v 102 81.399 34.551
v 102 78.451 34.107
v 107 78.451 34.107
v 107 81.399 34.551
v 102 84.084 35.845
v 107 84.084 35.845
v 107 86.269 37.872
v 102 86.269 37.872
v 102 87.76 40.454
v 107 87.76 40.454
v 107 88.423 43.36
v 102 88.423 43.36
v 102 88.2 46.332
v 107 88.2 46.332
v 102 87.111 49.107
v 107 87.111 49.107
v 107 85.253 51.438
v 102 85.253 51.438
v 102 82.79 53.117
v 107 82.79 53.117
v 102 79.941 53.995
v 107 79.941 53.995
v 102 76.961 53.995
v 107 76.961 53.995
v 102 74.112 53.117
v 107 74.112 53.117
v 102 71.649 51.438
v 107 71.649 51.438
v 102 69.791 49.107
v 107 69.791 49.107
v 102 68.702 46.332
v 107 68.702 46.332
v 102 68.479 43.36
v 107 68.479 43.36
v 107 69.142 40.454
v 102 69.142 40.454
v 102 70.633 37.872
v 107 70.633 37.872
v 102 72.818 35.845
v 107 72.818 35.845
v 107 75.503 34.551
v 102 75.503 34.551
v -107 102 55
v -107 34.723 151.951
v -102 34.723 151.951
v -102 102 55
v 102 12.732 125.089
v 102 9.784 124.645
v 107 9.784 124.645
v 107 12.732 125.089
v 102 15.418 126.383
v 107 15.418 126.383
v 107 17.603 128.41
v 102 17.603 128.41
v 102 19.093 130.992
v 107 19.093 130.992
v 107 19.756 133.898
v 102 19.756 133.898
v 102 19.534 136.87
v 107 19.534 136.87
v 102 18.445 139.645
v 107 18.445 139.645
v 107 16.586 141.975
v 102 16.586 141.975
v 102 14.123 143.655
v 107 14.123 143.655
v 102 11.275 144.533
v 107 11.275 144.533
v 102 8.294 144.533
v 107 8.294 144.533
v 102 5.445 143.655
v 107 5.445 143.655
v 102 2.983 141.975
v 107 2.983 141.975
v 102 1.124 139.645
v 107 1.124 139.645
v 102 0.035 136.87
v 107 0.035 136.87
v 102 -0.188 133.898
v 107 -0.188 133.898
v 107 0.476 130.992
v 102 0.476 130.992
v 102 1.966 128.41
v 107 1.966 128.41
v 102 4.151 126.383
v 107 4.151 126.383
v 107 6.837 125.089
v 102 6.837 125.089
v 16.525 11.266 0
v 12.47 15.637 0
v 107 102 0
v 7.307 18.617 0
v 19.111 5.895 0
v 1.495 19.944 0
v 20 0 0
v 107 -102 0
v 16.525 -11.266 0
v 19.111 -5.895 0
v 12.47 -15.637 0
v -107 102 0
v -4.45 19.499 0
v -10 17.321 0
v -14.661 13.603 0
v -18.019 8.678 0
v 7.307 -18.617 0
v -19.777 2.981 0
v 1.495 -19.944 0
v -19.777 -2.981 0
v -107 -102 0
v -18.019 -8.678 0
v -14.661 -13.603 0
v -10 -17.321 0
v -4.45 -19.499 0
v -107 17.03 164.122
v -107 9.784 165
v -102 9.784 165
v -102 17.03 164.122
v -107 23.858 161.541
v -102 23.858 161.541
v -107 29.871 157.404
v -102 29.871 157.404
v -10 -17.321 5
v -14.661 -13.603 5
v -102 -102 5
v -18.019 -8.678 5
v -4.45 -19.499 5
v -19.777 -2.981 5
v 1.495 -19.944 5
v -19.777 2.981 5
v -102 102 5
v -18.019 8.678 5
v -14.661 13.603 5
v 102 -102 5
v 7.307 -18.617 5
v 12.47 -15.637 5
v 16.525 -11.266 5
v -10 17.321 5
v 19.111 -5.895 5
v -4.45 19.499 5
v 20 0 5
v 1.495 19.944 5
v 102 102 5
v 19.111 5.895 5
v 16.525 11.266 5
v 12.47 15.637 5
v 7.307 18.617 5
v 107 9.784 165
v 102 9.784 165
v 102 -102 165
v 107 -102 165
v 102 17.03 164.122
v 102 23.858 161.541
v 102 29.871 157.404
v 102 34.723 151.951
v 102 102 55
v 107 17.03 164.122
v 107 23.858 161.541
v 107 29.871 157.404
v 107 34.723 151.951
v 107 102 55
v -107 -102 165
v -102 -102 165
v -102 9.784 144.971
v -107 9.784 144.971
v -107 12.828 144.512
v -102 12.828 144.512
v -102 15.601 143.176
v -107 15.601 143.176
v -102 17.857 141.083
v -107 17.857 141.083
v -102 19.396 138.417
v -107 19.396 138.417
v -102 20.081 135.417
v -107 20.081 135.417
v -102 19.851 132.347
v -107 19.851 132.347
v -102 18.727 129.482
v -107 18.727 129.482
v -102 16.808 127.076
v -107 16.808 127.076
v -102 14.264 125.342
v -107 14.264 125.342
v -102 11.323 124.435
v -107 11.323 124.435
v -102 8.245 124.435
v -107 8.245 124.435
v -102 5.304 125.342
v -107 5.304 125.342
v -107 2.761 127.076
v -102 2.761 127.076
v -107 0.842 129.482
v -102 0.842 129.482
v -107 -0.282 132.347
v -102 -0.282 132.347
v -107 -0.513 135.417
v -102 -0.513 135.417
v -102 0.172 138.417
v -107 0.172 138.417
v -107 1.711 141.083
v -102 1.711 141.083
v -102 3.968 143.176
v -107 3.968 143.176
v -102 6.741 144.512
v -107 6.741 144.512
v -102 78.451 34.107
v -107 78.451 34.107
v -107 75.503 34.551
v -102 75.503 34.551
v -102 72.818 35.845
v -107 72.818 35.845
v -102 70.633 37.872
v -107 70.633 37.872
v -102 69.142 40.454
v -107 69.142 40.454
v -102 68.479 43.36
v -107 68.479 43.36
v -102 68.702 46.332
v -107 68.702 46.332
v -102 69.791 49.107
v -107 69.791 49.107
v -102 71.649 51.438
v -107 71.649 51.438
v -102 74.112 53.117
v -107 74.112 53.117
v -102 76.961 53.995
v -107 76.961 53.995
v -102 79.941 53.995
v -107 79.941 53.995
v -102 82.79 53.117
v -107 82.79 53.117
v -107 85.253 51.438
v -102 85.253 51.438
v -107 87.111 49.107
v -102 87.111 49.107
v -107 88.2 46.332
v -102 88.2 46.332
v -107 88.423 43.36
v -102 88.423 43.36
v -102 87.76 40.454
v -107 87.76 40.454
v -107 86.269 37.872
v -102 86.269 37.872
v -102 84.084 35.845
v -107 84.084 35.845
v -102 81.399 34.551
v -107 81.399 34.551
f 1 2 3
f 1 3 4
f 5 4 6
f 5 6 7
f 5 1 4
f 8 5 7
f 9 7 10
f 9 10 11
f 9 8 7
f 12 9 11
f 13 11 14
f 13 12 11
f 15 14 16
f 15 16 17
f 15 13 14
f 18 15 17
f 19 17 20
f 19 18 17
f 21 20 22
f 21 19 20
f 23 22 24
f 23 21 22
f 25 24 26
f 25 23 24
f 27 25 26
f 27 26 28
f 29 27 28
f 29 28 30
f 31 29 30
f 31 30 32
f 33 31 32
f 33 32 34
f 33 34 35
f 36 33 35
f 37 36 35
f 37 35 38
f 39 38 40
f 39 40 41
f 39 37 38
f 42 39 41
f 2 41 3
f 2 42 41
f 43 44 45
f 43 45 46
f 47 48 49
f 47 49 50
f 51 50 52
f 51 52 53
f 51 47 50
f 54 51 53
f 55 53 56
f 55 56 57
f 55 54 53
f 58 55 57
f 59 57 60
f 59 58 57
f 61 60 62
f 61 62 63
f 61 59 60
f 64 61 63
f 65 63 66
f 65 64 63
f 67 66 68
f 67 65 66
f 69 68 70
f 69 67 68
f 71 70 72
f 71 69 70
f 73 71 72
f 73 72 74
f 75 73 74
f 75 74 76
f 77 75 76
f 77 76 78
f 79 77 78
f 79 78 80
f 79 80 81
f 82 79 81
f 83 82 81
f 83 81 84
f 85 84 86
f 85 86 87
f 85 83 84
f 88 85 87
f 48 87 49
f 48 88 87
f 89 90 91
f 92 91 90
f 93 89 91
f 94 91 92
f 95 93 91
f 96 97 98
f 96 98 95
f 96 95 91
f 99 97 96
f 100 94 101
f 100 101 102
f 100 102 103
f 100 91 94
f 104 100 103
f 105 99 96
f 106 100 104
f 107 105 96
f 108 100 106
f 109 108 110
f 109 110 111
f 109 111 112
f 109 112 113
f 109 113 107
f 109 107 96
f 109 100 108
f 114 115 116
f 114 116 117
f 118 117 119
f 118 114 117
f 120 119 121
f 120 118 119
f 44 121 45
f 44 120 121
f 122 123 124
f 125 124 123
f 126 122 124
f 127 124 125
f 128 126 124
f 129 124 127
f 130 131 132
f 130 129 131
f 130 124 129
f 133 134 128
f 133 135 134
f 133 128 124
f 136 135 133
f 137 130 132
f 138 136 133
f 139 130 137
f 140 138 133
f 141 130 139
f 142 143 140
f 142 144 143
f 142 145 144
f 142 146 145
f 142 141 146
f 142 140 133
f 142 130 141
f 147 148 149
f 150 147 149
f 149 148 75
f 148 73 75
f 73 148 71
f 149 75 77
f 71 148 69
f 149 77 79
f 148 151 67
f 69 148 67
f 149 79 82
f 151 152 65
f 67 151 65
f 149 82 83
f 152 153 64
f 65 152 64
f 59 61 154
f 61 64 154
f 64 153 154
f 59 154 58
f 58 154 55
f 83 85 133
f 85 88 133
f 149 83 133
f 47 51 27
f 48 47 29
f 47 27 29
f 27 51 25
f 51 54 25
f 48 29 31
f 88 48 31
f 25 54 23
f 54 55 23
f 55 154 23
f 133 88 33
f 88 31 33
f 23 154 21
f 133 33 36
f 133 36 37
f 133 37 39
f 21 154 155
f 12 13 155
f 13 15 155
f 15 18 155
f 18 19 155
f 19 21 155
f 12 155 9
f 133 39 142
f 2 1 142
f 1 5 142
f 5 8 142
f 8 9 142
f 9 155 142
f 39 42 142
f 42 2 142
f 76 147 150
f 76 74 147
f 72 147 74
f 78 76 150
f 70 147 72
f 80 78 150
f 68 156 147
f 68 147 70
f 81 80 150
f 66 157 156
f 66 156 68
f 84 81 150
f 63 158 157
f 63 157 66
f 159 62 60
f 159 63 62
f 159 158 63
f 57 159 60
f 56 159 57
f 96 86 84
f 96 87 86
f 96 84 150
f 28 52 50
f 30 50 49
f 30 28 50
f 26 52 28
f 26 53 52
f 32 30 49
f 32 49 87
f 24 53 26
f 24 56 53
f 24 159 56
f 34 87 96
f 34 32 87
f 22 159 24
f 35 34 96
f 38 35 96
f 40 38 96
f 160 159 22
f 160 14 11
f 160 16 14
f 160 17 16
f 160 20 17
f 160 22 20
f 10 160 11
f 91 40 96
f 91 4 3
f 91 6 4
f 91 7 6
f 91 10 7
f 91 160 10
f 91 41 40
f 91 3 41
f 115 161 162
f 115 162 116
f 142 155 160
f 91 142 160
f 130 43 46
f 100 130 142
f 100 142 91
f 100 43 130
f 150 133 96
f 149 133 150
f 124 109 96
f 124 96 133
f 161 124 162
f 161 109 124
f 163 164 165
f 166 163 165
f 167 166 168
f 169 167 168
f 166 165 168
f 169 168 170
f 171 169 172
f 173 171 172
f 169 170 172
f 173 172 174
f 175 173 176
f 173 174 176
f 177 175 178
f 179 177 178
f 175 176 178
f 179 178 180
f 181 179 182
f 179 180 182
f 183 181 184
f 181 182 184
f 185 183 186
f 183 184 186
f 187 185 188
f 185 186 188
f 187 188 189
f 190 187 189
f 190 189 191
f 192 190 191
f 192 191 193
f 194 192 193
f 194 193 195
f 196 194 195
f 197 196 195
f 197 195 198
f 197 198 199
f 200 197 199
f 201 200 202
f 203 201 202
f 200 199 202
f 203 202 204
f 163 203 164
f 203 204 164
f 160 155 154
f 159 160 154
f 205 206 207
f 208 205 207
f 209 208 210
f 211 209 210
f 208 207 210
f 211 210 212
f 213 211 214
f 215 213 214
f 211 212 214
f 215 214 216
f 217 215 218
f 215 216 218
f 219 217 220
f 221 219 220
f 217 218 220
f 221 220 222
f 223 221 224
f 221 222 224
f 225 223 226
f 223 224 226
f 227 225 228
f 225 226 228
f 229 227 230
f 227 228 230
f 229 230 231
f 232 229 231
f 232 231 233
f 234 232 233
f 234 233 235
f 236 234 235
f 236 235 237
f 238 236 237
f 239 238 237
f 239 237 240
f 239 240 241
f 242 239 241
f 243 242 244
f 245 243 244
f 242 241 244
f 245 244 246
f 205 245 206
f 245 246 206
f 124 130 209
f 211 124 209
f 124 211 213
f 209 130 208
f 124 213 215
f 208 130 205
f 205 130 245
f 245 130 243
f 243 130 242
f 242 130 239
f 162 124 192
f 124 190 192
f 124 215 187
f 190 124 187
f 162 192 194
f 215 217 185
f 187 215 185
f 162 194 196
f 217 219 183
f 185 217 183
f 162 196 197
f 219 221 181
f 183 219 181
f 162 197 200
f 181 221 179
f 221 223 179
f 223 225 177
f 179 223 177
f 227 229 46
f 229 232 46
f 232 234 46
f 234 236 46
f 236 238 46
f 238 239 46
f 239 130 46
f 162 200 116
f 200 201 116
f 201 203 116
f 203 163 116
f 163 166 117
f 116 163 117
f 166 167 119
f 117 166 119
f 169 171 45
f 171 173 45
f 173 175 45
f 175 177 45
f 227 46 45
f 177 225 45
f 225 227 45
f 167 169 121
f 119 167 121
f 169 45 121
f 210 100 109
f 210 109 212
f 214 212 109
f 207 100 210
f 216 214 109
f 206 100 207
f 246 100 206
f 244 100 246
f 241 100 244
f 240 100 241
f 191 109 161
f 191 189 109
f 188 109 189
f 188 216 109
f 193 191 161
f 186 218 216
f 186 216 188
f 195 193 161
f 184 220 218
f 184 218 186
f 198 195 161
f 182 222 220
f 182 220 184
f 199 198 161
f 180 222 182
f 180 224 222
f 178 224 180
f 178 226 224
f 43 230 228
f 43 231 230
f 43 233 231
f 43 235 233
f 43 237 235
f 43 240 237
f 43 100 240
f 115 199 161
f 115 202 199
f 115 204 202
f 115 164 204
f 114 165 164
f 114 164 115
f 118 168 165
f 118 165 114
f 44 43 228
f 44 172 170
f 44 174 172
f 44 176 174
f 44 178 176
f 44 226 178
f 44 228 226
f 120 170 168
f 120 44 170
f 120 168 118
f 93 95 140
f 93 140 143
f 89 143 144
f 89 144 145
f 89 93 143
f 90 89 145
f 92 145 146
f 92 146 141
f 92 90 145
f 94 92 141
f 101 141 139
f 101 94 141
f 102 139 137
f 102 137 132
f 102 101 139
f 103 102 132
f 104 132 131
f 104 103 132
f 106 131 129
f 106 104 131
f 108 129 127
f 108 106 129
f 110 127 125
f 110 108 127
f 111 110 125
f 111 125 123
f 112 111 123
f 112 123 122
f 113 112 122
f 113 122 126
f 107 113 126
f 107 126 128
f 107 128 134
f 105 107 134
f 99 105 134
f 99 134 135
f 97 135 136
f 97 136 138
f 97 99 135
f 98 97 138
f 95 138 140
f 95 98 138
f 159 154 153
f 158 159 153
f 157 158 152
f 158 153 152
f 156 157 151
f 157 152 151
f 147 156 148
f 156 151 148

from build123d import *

# Parameters (mm, degrees)
SKETCH1_W           = 204
SKETCH1_H           = 204
SKETCH1_R           = 20
BOSS_EXTRUDE1_DEPTH = 5
SKETCH2_R           = 10
BOSS_EXTRUDE2_DEPTH = 5
BOSS_EXTRUDE3_START = 5
SKETCH3_R           = 10
SKETCH3_R_2         = 10.325688869
BOSS_EXTRUDE3_DEPTH = 5


with BuildPart() as part:
    # Sketch1 → Boss-Extrude1 (new body)
    with BuildSketch(Plane.XY):
        Rectangle(SKETCH1_W, SKETCH1_H)
        Circle(SKETCH1_R, mode=Mode.SUBTRACT)
    extrude(amount=BOSS_EXTRUDE1_DEPTH)

    # Sketch2 → Boss-Extrude2 (add)
    with BuildSketch(Plane(origin=(102, 0, 0), x_dir=(0, 0, -1), z_dir=(1, 0, 0))):
        with BuildLine():
            Line((0, 102), (-55, 102))
            Line((-55, 102), (-151.95068894, 34.723038836))
            ThreePointArc((-151.95068894, 34.723038836), (-161.540540881, 23.857555439), (-165, 9.784313725))
            Line((-165, 9.784313725), (-165, -102))
            Line((-165, -102), (-55, -102))
            Line((-55, -102), (0, -102))
            Line((0, -102), (0, 102))
        make_face()
        with Locations((-44.107183944, 78.450980392)):
            Circle(SKETCH2_R, mode=Mode.SUBTRACT)
        with Locations((-134.644967247, 9.784313725)):
            Circle(SKETCH2_R, mode=Mode.SUBTRACT)
    extrude(amount=BOSS_EXTRUDE2_DEPTH)

    # Sketch3 → Boss-Extrude3 (add)
    with BuildSketch(Plane.ZY.offset(102).offset(BOSS_EXTRUDE3_START)):
        with BuildLine():
            Line((0, 102), (0, -102))
            Line((0, -102), (165, -102))
            Line((165, -102), (165, 9.784313725))
            ThreePointArc((165, 9.784313725), (161.540540881, 23.857555439), (151.95068894, 34.723038836))
            Line((151.95068894, 34.723038836), (55, 102))
            Line((55, 102), (0, 102))
        make_face()
        with Locations(Location((44.107183944, 78.450980392, 0), (0, 0, 180))):
            Circle(SKETCH3_R, mode=Mode.SUBTRACT)
        with Locations((134.644967247, 9.784313725)):
            Circle(SKETCH3_R_2, mode=Mode.SUBTRACT)
    extrude(amount=-BOSS_EXTRUDE3_DEPTH)


solid = part.part
